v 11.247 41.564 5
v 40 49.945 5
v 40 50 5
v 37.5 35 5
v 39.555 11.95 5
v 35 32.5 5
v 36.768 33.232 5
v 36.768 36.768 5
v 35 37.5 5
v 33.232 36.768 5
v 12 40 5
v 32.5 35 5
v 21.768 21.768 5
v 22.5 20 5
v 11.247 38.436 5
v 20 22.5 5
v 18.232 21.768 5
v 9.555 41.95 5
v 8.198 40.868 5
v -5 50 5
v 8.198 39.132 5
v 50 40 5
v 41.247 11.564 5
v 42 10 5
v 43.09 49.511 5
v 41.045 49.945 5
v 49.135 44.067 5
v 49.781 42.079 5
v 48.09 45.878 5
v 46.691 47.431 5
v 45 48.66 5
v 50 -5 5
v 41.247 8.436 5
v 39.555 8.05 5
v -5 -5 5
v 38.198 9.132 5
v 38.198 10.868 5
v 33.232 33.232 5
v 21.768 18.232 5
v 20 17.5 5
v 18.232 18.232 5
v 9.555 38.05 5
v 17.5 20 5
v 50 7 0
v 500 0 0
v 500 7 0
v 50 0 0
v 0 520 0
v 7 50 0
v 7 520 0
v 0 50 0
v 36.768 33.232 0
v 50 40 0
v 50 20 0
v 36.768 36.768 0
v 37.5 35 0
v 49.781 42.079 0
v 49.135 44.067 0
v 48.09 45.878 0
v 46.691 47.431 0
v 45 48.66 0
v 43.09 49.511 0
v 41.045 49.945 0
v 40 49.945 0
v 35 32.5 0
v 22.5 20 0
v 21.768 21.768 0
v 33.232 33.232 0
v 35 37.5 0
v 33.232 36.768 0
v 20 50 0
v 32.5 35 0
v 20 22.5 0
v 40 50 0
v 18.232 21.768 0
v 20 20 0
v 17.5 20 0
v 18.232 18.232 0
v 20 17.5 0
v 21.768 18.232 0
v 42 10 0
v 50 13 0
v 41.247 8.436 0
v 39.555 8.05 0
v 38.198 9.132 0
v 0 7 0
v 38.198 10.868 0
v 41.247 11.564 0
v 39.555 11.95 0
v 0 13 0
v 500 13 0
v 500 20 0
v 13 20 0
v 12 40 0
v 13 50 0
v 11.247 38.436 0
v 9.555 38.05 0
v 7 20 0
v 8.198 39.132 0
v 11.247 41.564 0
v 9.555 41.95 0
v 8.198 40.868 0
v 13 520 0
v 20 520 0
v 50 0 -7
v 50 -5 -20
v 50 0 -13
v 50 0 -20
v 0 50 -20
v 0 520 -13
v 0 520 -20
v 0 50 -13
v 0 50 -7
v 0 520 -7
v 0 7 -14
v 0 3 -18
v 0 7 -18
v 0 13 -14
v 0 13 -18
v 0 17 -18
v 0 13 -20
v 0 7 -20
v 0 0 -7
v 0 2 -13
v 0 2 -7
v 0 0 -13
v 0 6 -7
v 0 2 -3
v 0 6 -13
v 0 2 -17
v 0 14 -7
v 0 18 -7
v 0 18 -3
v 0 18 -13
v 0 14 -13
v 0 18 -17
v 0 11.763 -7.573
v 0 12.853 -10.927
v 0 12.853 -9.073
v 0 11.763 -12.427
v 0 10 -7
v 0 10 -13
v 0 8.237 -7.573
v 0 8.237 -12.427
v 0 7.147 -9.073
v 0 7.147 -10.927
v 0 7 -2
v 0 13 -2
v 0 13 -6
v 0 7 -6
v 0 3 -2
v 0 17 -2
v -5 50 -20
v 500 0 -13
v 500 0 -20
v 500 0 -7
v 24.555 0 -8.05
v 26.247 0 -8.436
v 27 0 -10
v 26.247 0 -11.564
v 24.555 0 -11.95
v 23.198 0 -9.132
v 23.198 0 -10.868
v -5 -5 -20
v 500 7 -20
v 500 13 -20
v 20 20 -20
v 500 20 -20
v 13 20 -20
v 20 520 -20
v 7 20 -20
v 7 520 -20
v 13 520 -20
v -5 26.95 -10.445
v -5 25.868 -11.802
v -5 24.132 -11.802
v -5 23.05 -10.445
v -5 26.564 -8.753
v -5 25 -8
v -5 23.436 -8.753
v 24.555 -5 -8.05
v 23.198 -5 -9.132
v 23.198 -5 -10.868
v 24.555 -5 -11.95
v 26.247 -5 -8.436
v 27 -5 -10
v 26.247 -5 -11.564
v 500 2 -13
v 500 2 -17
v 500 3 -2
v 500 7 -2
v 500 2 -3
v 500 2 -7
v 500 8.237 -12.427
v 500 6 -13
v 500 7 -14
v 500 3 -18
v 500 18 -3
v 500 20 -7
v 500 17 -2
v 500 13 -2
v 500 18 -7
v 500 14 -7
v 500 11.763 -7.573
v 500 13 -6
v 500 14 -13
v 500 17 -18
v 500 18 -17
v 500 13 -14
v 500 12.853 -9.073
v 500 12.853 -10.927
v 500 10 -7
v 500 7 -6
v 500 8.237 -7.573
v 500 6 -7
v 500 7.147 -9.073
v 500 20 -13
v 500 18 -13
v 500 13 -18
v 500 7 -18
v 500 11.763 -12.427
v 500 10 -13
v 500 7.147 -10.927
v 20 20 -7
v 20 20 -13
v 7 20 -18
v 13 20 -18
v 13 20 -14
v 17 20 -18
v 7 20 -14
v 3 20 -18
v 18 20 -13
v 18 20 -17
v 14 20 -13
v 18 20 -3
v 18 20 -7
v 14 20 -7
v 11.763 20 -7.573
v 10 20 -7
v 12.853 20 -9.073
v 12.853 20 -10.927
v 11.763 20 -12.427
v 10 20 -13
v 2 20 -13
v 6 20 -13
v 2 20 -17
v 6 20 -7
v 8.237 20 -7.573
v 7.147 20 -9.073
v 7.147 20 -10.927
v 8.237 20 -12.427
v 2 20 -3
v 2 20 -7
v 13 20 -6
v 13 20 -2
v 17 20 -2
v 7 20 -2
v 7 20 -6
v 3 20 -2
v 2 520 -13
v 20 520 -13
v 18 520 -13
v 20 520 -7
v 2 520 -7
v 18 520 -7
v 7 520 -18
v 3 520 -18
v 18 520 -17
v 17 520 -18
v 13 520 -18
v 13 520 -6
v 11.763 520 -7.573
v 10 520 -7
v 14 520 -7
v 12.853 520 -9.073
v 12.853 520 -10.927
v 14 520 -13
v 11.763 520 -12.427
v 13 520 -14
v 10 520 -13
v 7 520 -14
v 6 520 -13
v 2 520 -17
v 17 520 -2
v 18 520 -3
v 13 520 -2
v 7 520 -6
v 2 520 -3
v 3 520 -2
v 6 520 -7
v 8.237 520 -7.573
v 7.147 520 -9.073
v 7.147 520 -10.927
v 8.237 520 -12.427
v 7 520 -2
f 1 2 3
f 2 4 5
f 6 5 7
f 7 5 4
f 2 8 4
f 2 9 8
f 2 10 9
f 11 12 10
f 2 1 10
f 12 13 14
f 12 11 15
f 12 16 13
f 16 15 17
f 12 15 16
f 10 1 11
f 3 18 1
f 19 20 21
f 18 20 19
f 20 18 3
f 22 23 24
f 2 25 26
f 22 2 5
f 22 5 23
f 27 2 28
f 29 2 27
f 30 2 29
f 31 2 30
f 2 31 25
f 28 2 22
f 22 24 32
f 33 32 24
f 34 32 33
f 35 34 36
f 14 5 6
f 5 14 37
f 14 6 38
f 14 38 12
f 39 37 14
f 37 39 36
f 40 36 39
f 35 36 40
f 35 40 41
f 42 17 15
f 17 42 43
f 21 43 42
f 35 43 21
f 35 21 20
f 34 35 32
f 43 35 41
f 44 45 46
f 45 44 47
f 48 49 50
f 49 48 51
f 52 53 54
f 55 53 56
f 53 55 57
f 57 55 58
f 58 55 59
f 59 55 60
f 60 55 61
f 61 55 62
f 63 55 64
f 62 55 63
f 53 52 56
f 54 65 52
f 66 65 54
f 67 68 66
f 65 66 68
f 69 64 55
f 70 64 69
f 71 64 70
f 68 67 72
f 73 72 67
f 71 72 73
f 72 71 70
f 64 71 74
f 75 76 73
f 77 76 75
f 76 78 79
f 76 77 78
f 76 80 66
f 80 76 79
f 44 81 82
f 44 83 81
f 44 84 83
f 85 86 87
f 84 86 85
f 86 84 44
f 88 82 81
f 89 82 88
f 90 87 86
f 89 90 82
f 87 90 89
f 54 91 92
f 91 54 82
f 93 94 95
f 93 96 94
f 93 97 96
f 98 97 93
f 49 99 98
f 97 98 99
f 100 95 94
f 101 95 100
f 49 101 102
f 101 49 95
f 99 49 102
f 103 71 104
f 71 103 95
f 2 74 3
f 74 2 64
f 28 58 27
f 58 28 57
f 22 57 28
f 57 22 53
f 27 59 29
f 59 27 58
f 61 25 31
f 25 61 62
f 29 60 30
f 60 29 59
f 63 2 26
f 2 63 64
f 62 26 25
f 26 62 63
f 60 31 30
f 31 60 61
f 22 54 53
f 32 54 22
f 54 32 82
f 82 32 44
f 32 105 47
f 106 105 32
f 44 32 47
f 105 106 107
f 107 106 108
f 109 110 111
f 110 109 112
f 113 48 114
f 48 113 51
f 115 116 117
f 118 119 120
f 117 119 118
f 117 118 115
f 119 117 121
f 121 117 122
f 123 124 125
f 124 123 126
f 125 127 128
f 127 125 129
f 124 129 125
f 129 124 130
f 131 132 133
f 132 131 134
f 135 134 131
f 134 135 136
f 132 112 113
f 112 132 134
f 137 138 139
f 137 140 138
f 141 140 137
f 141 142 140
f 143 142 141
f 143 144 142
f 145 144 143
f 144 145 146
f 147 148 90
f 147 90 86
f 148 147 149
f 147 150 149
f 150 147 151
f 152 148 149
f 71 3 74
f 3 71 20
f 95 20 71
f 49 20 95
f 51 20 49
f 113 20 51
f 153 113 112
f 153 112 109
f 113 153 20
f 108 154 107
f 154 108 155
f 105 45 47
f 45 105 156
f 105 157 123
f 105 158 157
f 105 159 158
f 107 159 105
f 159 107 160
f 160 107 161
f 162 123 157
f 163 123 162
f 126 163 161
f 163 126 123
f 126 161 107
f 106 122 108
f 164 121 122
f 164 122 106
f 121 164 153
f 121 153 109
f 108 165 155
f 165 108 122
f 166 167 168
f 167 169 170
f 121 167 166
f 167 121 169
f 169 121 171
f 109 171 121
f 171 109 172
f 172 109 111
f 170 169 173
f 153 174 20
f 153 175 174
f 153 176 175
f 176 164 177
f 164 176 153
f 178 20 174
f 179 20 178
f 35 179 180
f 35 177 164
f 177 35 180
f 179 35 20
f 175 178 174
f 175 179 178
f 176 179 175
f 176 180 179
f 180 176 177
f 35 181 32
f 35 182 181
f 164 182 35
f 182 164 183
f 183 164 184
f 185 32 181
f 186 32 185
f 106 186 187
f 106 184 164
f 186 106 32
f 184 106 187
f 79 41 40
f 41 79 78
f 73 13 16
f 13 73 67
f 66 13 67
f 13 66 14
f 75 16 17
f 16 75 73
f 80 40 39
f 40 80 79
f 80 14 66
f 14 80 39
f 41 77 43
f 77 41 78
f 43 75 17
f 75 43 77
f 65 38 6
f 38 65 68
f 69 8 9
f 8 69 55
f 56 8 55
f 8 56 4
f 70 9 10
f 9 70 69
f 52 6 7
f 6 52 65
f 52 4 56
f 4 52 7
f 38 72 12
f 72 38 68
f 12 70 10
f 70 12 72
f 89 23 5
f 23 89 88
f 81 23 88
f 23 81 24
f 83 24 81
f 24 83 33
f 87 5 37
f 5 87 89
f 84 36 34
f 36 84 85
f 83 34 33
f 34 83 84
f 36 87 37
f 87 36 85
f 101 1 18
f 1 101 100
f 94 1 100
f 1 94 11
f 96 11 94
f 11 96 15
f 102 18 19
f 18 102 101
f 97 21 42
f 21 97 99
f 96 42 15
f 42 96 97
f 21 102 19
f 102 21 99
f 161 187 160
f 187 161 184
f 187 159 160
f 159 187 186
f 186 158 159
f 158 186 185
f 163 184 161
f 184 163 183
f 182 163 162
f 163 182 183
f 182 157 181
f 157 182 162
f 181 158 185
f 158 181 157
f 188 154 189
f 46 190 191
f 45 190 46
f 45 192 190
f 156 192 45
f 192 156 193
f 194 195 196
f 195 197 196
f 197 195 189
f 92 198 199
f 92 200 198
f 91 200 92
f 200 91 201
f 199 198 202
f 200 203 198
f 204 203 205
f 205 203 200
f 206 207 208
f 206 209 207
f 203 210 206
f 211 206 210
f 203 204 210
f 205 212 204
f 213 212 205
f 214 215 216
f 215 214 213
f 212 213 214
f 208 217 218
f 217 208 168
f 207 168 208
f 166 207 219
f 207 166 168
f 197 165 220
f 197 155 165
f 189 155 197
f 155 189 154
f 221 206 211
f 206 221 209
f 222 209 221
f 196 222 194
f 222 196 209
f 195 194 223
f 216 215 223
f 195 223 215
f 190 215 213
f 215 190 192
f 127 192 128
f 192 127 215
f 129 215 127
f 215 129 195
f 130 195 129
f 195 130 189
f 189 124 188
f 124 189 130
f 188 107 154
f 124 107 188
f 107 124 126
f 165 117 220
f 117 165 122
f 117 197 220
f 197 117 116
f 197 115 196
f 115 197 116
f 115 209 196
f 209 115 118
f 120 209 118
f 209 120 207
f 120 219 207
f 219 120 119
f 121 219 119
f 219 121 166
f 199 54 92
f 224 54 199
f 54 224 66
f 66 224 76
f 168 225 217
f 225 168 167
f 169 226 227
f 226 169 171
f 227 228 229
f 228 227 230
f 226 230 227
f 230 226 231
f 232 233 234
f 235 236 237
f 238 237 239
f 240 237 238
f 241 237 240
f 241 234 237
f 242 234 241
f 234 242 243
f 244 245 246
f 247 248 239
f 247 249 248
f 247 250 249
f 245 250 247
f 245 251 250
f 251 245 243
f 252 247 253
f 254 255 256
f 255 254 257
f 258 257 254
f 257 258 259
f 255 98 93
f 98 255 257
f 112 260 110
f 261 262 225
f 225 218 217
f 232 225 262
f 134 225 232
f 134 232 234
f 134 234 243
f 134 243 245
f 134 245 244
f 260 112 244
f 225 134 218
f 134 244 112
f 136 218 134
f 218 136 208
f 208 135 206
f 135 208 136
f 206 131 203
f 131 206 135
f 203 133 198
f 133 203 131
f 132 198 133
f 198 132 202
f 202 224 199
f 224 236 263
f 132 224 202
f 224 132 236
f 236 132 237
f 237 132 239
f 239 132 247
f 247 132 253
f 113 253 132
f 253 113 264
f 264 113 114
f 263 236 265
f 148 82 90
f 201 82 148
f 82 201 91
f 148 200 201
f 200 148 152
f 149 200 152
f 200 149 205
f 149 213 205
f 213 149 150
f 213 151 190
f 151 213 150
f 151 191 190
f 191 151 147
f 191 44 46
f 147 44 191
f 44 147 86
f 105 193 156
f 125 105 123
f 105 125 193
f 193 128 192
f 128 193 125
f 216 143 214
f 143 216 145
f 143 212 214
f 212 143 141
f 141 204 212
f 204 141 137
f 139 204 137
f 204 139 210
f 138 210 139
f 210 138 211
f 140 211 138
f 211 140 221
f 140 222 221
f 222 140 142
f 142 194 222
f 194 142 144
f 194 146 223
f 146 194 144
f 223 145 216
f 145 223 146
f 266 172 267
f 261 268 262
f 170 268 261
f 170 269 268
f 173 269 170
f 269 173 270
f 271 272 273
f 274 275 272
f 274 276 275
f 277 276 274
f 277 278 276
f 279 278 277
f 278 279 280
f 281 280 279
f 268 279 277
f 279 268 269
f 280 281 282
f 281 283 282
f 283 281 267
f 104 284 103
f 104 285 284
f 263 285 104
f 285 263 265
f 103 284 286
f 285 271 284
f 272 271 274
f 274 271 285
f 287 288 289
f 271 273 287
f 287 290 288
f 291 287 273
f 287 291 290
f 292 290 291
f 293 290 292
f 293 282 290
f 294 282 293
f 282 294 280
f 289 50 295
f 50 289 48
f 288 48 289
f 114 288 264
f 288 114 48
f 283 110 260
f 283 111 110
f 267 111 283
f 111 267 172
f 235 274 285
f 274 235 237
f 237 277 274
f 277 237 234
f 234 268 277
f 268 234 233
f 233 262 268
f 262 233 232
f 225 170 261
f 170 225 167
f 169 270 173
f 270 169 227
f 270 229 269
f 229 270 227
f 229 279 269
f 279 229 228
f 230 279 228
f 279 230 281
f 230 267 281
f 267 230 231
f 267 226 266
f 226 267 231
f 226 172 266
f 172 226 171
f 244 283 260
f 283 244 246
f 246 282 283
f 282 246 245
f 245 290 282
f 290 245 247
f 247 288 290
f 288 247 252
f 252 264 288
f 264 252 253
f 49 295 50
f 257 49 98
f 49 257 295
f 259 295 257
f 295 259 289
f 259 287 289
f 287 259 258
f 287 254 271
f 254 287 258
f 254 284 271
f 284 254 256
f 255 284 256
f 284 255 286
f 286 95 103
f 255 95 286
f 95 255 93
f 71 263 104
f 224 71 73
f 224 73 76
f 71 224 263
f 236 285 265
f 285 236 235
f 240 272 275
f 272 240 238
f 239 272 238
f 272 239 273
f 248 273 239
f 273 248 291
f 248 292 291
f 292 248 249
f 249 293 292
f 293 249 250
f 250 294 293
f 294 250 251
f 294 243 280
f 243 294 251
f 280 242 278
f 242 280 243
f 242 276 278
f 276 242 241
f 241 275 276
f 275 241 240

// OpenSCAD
// file: ../simple_rounded_cube.scad
module sr_cube(size=[1,1,1],radius=0.5,corners=[1,1,1,1]) {
    difference(){    
    cube(size);
    
        if(corners[0])
        translate([radius,radius,0])rotate([0,0,180])difference(){
                cube([radius*2,radius*2,size[2]]);
                cylinder(size[2],radius,radius);
        }
        if(corners[1])
        translate([size[0]-radius,radius,0])rotate([0,0,270])difference(){
                cube([radius*2,radius*2,size[2]]);
                cylinder(size[2],radius,radius);
        }
        if(corners[2])
        translate([size[0]-radius,size[1]-radius,0])rotate([0,0,0])difference(){
                cube([radius*2,radius*2,size[2]]);
                cylinder(size[2],radius,radius);
        }
        if(corners[3])
        translate([radius,size[1]-radius,0])rotate([0,0,90])difference(){
                cube([radius*2,radius*2,size[2]]);
                cylinder(size[2],radius,radius);
        }
        }
        
}


//sr_cube([20,20,5], radius=4,corners=[0,0,0,0]);
// main file
module cutout() {
    polygon([[0,7],[2,7],[2,3],[6,7],[6,13],[2,17],[2,13],[0,13]]);
}

module profile2020(l) {
    color([0,0,1])
        linear_extrude(l)
            difference(){
                square(20);
                cutout();
                translate([20,0,0])rotate([0,0,90]) cutout();
                translate([20,20,0])rotate([0,0,180]) cutout();
                translate([0,20,0])rotate([0,0,270]) cutout();
                translate([10,10,0])circle(3);
            }
}


translate([0,0,0])rotate([0,90,0])profile2020(500);
translate([20,20,0])rotate([0,90,90])profile2020(500);



rail_w = 12;
rail_h = 8;

carriage_l = 46;
carriage_w = 27;
carriage_hole_distance = 20;

railandcarriage_h = 13;


pulleys_inner_dia = 12;
pulleys_outer_dia = 18;
pulleys_h = 9;




s = 5;
l = 50;
w = 50;


sd = 5;
m4=4;
h1_s = 20;
h2_s = 35;
//todo aussparung der schraubenkoepfe weil profil im weg
include<../simple_rounded_cube.scad>

difference(){
    union(){
        sr_cube([l,w,s],radius=10,corners=[0,0,1,0]);
        translate([-s,-s,-20]) {
            cube([l+s,s,20+s]);
            cube([s,w+s,20+s]);
        }
    }
    
    translate([h1_s,h1_s,0]) cylinder(s,sd/2,sd/2);
    translate([h2_s,h2_s,0]) cylinder(s,sd/2,sd/2);
    
    translate([l-10,10,0]) cylinder(s,m4/2,m4/2);
    translate([10,w-10,0]) cylinder(s,m4/2,m4/2);
    translate([25,-s,-10]) rotate([-90,0,0])cylinder(s,m4/2,m4/2);
    translate([-s,25,-10]) rotate([0,-90,0])cylinder(s,m4/2,m4/2);
}
